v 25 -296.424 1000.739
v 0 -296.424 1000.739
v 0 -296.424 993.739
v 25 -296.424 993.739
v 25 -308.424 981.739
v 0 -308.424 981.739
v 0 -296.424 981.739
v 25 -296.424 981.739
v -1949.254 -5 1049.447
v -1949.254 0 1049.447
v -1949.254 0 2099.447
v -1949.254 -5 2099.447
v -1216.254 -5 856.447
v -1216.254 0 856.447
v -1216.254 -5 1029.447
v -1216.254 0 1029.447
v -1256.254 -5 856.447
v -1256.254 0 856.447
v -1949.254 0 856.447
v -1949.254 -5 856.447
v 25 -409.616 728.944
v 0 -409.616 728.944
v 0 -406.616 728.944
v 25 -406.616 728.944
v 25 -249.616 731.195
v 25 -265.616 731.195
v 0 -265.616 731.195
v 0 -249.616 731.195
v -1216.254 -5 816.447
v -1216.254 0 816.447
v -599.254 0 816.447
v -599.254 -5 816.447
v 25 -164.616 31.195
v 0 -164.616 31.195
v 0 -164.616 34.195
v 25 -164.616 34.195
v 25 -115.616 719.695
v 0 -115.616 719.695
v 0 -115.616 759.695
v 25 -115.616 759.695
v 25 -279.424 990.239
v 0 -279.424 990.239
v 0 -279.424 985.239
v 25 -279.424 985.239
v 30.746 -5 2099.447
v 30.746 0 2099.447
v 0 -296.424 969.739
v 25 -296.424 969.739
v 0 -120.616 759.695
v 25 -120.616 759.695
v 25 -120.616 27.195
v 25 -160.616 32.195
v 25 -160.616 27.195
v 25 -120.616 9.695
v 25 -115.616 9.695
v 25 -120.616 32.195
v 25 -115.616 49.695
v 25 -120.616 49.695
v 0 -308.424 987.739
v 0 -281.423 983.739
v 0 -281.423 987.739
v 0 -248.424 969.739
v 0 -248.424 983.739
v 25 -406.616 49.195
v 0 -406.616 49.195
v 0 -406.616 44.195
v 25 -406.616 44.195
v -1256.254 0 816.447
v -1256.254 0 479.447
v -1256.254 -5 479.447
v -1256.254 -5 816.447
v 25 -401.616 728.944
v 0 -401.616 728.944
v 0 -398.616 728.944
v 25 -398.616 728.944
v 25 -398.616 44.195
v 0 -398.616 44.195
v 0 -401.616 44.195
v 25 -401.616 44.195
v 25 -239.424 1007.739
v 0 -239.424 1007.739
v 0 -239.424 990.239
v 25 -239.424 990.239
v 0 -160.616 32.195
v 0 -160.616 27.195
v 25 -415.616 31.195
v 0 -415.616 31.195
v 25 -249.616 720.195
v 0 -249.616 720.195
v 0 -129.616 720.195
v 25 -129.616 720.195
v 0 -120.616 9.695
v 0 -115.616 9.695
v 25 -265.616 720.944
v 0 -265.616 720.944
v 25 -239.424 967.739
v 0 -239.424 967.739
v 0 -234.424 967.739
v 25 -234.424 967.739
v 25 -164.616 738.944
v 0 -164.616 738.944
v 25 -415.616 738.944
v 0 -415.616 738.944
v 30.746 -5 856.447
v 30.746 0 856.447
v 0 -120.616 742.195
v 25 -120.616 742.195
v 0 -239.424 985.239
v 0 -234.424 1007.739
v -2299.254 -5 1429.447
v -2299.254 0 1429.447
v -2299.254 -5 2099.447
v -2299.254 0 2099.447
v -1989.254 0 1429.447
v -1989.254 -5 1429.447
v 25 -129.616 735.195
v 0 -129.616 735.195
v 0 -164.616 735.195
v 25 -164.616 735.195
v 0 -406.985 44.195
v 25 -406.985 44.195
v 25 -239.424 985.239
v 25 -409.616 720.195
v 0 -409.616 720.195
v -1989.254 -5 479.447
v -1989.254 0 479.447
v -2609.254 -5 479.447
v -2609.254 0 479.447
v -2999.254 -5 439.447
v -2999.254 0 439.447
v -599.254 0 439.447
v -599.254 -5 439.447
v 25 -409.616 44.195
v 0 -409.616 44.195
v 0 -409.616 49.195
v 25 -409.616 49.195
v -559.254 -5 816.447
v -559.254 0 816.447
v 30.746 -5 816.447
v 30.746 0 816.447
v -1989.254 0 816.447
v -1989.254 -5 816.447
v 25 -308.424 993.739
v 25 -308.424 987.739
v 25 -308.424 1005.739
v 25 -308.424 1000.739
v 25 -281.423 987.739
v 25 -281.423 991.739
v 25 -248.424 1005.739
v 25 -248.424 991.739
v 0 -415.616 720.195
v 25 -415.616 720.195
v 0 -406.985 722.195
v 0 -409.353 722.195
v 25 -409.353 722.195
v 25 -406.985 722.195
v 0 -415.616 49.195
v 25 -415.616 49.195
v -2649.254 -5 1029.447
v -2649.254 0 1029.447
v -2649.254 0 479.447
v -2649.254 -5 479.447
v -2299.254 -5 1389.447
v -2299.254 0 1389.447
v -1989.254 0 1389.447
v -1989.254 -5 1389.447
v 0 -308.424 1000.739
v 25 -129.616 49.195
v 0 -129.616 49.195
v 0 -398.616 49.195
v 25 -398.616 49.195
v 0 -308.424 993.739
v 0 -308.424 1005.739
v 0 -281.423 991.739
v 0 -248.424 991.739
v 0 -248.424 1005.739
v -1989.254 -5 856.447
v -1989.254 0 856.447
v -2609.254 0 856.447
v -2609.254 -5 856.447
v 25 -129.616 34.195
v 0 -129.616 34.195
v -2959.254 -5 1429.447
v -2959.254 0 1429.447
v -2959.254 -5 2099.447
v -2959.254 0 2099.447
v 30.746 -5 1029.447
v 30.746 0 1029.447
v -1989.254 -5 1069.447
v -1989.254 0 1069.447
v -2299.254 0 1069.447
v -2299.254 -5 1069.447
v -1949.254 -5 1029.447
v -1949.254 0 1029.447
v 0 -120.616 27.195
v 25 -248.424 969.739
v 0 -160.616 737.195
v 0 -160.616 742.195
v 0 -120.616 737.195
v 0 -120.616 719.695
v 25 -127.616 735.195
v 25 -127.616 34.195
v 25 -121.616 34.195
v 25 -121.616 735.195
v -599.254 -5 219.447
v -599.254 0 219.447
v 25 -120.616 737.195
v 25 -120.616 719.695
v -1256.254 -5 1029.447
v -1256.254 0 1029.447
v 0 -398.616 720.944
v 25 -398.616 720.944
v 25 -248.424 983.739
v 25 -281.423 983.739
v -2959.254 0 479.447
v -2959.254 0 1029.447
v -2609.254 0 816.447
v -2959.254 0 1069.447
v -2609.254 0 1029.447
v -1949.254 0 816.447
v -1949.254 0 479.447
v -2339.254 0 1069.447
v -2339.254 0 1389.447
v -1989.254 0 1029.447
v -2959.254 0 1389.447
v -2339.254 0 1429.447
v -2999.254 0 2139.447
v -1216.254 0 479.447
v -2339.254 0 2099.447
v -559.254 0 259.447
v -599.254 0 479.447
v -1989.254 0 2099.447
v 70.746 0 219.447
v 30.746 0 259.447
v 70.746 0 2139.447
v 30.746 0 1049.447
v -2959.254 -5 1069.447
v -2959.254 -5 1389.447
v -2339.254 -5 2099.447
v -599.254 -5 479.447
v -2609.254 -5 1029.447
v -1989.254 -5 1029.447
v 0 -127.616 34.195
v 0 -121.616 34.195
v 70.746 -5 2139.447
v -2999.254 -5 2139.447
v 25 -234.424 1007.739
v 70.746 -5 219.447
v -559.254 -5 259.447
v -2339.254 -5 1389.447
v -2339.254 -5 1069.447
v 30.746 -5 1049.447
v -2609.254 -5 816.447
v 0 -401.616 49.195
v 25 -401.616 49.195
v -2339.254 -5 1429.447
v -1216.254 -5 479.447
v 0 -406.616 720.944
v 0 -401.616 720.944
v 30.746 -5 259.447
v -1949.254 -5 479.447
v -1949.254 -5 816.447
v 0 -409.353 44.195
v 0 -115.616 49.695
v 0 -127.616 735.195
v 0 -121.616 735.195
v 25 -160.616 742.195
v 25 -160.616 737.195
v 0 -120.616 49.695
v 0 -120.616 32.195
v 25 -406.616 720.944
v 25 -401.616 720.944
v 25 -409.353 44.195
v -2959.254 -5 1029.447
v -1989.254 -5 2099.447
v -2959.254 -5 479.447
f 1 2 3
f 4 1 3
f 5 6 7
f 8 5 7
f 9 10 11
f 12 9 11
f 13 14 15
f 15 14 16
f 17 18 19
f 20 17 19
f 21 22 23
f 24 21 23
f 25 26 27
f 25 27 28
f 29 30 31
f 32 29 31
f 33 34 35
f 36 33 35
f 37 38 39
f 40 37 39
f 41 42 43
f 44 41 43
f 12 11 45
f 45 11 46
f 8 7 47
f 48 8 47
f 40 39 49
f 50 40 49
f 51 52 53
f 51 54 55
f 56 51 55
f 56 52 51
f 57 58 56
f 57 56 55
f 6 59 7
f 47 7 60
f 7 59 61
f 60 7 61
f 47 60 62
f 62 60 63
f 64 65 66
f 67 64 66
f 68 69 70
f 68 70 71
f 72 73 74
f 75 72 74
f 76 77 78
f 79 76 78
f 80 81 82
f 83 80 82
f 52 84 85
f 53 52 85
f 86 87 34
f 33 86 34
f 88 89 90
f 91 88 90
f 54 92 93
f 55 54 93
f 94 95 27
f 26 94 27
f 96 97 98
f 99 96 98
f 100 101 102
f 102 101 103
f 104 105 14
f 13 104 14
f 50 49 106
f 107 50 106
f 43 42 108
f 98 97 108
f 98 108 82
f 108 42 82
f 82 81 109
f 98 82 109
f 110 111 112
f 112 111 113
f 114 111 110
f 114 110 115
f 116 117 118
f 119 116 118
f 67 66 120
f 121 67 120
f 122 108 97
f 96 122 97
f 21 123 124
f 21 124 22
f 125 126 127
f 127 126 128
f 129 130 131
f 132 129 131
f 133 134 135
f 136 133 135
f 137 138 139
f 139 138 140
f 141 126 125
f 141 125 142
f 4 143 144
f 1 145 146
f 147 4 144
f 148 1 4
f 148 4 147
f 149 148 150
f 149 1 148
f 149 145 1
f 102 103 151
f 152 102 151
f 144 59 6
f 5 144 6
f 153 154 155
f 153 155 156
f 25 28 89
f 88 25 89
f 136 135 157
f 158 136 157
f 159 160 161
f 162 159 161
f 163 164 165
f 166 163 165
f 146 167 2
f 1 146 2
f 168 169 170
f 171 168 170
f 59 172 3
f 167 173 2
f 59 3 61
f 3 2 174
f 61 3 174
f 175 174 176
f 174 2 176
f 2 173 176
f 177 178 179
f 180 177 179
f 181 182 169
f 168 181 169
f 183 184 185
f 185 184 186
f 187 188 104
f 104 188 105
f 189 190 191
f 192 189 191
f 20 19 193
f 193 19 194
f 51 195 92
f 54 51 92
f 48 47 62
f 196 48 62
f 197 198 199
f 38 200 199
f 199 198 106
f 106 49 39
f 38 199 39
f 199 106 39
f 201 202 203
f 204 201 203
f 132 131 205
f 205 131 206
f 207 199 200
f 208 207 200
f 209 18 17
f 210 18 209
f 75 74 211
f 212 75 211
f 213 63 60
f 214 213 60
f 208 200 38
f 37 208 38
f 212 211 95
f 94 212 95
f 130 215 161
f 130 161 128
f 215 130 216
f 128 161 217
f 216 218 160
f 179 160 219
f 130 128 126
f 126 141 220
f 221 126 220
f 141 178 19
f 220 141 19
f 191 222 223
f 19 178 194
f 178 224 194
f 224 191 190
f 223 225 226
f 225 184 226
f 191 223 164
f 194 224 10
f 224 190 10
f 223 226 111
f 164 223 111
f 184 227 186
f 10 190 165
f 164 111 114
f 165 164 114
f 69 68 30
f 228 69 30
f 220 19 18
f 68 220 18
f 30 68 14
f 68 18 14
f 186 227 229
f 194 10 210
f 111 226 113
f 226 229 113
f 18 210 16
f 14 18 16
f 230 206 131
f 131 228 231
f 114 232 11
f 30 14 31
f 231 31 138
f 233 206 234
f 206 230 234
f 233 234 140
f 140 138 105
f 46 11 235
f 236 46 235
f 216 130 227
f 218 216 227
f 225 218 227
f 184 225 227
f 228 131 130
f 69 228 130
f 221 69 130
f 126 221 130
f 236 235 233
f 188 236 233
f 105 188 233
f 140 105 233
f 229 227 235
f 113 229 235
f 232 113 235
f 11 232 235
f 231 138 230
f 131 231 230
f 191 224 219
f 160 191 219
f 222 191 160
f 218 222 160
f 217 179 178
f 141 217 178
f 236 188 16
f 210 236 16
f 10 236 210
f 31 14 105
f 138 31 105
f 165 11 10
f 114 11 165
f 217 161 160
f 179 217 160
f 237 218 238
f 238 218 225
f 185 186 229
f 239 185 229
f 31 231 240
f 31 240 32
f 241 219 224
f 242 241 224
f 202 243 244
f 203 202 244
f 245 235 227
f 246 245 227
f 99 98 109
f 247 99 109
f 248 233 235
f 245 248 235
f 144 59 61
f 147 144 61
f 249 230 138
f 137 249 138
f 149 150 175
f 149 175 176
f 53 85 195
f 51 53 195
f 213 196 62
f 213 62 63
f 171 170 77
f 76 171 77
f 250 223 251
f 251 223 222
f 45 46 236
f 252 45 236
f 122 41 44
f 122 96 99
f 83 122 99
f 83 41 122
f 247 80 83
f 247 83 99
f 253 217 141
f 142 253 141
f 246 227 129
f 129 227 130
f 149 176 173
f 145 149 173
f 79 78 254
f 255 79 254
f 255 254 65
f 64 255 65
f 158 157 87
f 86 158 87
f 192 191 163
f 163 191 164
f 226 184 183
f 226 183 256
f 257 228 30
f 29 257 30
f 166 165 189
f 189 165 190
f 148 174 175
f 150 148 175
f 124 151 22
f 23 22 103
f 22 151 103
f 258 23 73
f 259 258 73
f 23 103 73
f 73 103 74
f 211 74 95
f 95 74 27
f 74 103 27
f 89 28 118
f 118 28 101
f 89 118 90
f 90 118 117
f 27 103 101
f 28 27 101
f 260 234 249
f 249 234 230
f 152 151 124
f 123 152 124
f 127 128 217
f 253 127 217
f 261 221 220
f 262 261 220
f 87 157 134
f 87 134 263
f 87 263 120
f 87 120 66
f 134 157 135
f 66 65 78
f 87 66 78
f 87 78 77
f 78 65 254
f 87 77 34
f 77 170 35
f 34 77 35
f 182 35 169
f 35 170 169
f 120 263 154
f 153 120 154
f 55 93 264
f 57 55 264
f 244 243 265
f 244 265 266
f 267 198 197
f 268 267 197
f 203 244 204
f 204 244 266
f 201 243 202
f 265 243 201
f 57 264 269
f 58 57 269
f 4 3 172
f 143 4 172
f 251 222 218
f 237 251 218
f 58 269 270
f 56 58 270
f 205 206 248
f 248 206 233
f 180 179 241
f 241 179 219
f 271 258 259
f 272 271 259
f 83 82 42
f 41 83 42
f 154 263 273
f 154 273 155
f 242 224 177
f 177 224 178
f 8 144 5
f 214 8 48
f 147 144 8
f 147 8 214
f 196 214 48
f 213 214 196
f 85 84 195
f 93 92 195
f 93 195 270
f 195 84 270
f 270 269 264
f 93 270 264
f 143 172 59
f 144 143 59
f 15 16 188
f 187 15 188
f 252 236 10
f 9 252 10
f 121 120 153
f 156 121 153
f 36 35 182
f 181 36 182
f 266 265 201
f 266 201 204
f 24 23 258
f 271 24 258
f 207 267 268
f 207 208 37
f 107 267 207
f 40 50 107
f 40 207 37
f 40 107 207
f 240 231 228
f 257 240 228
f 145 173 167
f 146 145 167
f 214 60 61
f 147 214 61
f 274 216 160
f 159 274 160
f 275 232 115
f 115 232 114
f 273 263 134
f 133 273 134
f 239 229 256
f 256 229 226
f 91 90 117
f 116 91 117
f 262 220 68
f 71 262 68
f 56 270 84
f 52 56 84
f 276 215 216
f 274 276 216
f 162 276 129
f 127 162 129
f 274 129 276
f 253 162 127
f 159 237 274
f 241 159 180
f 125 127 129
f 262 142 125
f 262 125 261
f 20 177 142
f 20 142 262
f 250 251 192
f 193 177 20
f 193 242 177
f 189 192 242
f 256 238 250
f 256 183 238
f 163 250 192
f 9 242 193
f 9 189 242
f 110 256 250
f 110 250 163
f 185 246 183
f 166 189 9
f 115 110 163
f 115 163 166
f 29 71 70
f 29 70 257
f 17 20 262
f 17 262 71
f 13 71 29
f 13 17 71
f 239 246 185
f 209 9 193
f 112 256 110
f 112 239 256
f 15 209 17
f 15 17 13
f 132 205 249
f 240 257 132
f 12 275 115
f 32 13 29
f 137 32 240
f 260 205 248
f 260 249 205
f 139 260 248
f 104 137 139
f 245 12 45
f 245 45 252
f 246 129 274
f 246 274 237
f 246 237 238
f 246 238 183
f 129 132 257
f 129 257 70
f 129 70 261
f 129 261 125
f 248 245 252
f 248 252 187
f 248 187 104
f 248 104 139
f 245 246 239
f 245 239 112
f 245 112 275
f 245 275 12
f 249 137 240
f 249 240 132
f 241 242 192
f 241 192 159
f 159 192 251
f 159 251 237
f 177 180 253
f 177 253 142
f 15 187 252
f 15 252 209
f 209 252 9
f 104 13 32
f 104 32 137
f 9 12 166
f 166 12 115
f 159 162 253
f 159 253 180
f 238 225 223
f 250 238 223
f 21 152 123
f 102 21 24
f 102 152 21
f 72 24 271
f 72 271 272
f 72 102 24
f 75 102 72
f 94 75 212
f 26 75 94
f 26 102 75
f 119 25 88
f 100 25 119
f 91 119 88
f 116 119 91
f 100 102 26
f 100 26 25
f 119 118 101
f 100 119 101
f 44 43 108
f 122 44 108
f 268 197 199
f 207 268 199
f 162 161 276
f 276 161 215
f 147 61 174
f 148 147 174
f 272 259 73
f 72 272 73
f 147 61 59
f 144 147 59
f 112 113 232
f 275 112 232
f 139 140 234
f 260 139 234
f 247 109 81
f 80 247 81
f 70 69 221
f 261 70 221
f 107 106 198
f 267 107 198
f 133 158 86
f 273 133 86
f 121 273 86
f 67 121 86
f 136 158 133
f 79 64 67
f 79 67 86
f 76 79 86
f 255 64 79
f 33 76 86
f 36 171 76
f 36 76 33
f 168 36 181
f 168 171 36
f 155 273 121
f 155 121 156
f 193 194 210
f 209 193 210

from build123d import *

# Parameters (mm, degrees)
F0_W     = 620
F0_H     = 40
F0_W_2   = 310
F0_W_3   = 40
F0_H_2   = 337
F0_H_3   = 173
F1_DEPTH = 5
F2_W     = 6
F2_H     = 701
F2_W_2   = 2.367705
F2_H_2   = 678
F3_DEPTH = 25
F5_DEPTH = 25
F6_DEPTH = 25


with BuildPart() as f1:
    # F0 (on Front) → F1 (new body)
    with BuildSketch(Plane.XZ):
        Polygon((-2959.253504, 2099.447314), (-2999.253504, 2139.447314), (-2999.253504, 439.447314), (-2959.253504, 479.447314), (-2959.253504, 1029.447314), (-2959.253504, 1069.447314), (-2959.253504, 1389.447314), (-2959.253504, 1429.447314), align=None)
        Polygon((70.746496, 2139.447314), (-2999.253504, 2139.447314), (-2959.253504, 2099.447314), (-2339.253504, 2099.447314), (-2299.253504, 2099.447314), (-1989.253504, 2099.447314), (-1949.253504, 2099.447314), (30.746496, 2099.447314), align=None)
        Polygon((70.746496, 219.447314), (70.746496, 2139.447314), (30.746496, 2099.447314), (30.746496, 1079.447314), (30.746496, 1049.447314), (30.746496, 1029.447314), (30.746496, 856.447314), (30.746496, 816.447314), (30.746496, 259.447314), align=None)
        Polygon((-2959.253504, 479.447314), (-2999.253504, 439.447314), (-599.253504, 439.447314), (-559.253504, 479.447314), (-599.253504, 479.447314), (-1216.253504, 479.447314), (-1256.253504, 479.447314), (-1949.253504, 479.447314), (-1989.253504, 479.447314), (-2609.253504, 479.447314), (-2649.253504, 479.447314), align=None)
        Polygon((-599.253504, 219.447314), (70.746496, 219.447314), (30.746496, 259.447314), (-559.253504, 259.447314), align=None)
        Polygon((-559.253504, 479.447314), (-599.253504, 439.447314), (-599.253504, 219.447314), (-559.253504, 259.447314), align=None)
        with Locations((-2649.253504, 1409.447314)):
            Rectangle(F0_W, F0_H)
        Polygon((-2299.253504, 2099.447314), (-2339.253504, 2099.447314), (-2339.253504, 1429.447314), (-2339.253504, 1389.447314), (-2339.253504, 1069.447314), (-2299.253504, 1069.447314), (-2299.253504, 1389.447314), (-2299.253504, 1429.447314), align=None)
        with Locations((-2144.253504, 1409.447314)):
            Rectangle(F0_W_2, F0_H)
        Polygon((-1949.253504, 1079.447314), (-1949.253504, 2099.447314), (-1989.253504, 2099.447314), (-1989.253504, 1429.447314), (-1989.253504, 1389.447314), (-1989.253504, 1069.447314), (-1989.253504, 1029.447314), (-1989.253504, 856.447314), (-1949.253504, 856.447314), (-1949.253504, 1029.447314), (-1949.253504, 1049.447314), align=None)
        Polygon((-2959.253504, 1069.447314), (-2959.253504, 1029.447314), (-2649.253504, 1029.447314), (-2609.253504, 1029.447314), (-1989.253504, 1029.447314), (-1989.253504, 1069.447314), (-2299.253504, 1069.447314), (-2339.253504, 1069.447314), align=None)
        Polygon((-2649.253504, 1029.447314), (-2649.253504, 479.447314), (-2609.253504, 479.447314), (-2609.253504, 816.447314), (-2609.253504, 856.447314), (-2609.253504, 1029.447314), align=None)
        Polygon((-559.253504, 816.447314), (30.746496, 816.447314), (30.746496, 856.447314), (-1216.253504, 856.447314), (-1256.253504, 856.447314), (-1949.253504, 856.447314), (-1989.253504, 856.447314), (-2609.253504, 856.447314), (-2609.253504, 816.447314), (-1989.253504, 816.447314), (-1949.253504, 816.447314), (-1256.253504, 816.447314), (-1216.253504, 816.447314), (-599.253504, 816.447314), align=None)
        with Locations((-1969.253504, 647.947314)):
            Rectangle(F0_W_3, F0_H_2)
        Polygon((30.746496, 1029.447314), (30.746496, 1049.447314), (-1949.253504, 1049.447314), (-1949.253504, 1029.447314), (-1256.253504, 1029.447314), (-1216.253504, 1029.447314), align=None)
        with Locations((-1236.253504, 942.947314)):
            Rectangle(F0_W_3, F0_H_3)
        with Locations((-1236.253504, 647.947314)):
            Rectangle(F0_W_3, F0_H_2)
        with Locations((-579.253504, 647.947314)):
            Rectangle(F0_W_3, F0_H_2)
    extrude(amount=F1_DEPTH)


with BuildPart() as f3:
    # F2 (on Right) → F3 (new body)
    with BuildSketch(Plane.YZ):
        Polygon((-115.615857, 9.694815), (-115.615857, 49.694815), (-120.615857, 49.694815), (-120.615857, 32.194815), (-160.615857, 32.194815), (-160.615857, 27.194815), (-120.615857, 27.194815), (-120.615857, 9.694815), align=None)
        Polygon((-115.615857, 719.694815), (-115.615857, 759.694815), (-120.615857, 759.694815), (-120.615857, 742.194815), (-160.615857, 742.194815), (-160.615857, 737.194815), (-120.615857, 737.194815), (-120.615857, 719.694815), align=None)
        with Locations((-124.615857, 384.694815)):
            Rectangle(F2_W, F2_H)
        Polygon((-164.615857, 735.194815), (-164.615857, 738.944089), (-415.615857, 738.944089), (-415.615857, 720.194815), (-409.615857, 720.194815), (-409.615857, 728.944089), (-406.615857, 728.944089), (-406.615857, 720.944089), (-401.615857, 720.944089), (-401.615857, 728.944089), (-398.615857, 728.944089), (-398.615857, 720.944089), (-265.615857, 720.944089), (-265.615857, 731.194815), (-249.615857, 731.194815), (-249.615857, 720.194815), (-129.615857, 720.194815), (-129.615857, 735.194815), align=None)
        Polygon((-164.615857, 34.194815), (-129.615857, 34.194815), (-129.615857, 49.194815), (-398.615857, 49.194815), (-398.615857, 44.194815), (-401.615857, 44.194815), (-401.615857, 49.194815), (-406.615857, 49.194815), (-406.615857, 44.194815), (-406.985492, 44.194815), (-409.353197, 44.194815), (-409.615857, 44.194815), (-409.615857, 49.194815), (-415.615857, 49.194815), (-415.615857, 31.194815), (-164.615857, 31.194815), align=None)
        with Locations((-408.169344, 383.194815)):
            Rectangle(F2_W_2, F2_H_2)
    extrude(amount=F3_DEPTH)


with BuildPart() as f5:
    # F4 (on Right) → F5 (new body)
    with BuildSketch(Plane.YZ):
        Polygon((-239.4242, 990.23865), (-279.4242, 990.23865), (-279.4242, 985.23865), (-239.4242, 985.23865), (-239.4242, 967.73865), (-234.4242, 967.73865), (-234.4242, 1007.73865), (-239.4242, 1007.73865), align=None)
        Polygon((-248.4242, 1005.73865), (-308.4242, 1005.73865), (-308.4242, 1000.73865), (-296.4242, 1000.73865), (-296.4242, 993.73865), (-308.4242, 993.73865), (-308.4242, 987.73865), (-281.422525, 987.73865), (-281.422525, 991.73865), (-248.4242, 991.73865), align=None)
    extrude(amount=F5_DEPTH)


with BuildPart() as f6:
    # F4 (on Right) → F6 (new body)
    with BuildSketch(Plane.YZ):
        Polygon((-281.422525, 983.73865), (-281.422525, 987.73865), (-308.4242, 987.73865), (-308.4242, 981.73865), (-296.4242, 981.73865), (-296.4242, 969.73865), (-248.4242, 969.73865), (-248.4242, 983.73865), align=None)
    extrude(amount=F6_DEPTH)


solid = Compound([f1.part, f3.part, f5.part, f6.part])
